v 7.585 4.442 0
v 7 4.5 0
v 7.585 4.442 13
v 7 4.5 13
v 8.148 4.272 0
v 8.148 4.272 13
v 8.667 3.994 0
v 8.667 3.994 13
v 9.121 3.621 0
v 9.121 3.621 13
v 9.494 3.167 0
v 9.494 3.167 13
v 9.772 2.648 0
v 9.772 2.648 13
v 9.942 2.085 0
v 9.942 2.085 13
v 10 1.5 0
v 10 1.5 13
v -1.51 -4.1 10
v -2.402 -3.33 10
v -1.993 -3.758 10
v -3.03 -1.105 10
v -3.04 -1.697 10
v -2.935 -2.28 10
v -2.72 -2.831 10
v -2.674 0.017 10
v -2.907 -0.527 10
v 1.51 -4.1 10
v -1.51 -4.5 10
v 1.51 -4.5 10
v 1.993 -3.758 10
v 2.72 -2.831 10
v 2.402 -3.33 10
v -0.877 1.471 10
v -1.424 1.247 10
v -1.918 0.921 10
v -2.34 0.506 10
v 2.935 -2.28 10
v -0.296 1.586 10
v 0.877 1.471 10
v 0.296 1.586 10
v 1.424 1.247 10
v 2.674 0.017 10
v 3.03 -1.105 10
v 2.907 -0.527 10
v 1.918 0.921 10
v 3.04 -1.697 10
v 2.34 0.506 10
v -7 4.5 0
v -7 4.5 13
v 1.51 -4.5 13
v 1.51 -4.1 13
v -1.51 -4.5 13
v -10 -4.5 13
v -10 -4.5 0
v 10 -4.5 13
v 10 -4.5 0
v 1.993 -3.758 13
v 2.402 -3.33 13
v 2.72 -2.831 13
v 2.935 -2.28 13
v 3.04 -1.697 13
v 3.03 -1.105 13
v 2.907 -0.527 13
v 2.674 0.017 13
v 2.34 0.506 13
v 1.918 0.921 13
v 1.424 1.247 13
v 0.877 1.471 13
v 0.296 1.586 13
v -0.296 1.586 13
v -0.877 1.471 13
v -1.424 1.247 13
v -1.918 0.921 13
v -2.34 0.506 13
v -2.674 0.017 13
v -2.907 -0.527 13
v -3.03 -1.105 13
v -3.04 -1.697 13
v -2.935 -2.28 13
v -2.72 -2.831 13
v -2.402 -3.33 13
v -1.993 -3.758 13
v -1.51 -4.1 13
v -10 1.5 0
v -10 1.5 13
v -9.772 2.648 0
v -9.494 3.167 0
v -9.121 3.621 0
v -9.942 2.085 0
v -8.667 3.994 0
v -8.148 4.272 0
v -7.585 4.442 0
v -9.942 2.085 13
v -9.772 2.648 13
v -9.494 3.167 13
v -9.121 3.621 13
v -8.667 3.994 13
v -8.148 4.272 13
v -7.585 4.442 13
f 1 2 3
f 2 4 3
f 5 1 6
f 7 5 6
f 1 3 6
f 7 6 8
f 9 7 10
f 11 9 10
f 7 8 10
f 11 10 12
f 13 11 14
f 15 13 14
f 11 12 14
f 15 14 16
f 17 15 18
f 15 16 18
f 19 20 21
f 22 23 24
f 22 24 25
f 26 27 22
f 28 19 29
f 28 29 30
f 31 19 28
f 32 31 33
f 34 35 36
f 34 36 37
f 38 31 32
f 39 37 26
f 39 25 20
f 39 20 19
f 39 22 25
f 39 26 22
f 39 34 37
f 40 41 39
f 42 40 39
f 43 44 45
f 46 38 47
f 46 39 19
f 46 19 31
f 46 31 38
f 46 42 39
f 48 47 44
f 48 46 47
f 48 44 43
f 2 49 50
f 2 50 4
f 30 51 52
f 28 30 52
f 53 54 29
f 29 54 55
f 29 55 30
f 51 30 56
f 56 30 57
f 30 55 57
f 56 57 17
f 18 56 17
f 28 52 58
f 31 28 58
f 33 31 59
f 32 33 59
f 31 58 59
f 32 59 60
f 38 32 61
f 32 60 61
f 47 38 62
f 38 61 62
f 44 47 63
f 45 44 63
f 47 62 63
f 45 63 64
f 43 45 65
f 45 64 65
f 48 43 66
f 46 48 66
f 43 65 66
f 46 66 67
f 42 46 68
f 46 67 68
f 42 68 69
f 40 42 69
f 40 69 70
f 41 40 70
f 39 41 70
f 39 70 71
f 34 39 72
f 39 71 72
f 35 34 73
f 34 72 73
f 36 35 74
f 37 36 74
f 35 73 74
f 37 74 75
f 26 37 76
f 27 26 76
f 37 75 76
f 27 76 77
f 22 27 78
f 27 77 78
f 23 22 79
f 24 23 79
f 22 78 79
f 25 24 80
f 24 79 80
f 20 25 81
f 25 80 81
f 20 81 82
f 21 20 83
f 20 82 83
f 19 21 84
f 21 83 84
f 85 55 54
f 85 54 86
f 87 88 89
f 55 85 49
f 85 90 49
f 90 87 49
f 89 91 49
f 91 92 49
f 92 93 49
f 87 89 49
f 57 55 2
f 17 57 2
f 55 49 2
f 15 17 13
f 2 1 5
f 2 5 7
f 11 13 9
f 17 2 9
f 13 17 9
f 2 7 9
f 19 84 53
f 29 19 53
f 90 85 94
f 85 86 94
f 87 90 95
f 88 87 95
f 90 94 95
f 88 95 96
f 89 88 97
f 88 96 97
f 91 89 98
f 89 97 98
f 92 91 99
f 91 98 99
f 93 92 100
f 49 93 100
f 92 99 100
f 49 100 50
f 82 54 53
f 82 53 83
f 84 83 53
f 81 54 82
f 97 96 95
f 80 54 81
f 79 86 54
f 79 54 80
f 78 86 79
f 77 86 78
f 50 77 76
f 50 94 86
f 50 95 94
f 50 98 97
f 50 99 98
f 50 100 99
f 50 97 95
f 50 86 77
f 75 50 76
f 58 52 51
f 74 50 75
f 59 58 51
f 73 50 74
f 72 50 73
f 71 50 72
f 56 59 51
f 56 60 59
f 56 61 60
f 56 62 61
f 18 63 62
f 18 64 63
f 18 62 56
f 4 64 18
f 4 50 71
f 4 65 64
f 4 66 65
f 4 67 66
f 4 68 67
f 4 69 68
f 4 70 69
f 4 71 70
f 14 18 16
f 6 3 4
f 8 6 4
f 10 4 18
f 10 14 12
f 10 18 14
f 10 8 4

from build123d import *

# Parameters (mm, degrees)
SKETCH1_W           = 20
SKETCH1_H           = 9
BOSS_EXTRUDE1_DEPTH = 13
CUT_EXTRUDE1_DEPTH  = 3
FILLET1_R           = 3


with BuildPart() as part:
    # Sketch1 → Boss-Extrude1 (new body)
    with BuildSketch(Plane.XY):
        Rectangle(SKETCH1_W, SKETCH1_H)
    extrude(amount=BOSS_EXTRUDE1_DEPTH)

    # Sketch2 → Cut-Extrude1 (cut)
    with BuildSketch(Plane.XY.offset(13)):
        with BuildLine():
            Line((1.51, -4.5), (1.51, -4.099981132))
            ThreePointArc((1.51, -4.099981132), (0, 1.6), (-1.51, -4.099981132))
            Line((-1.51, -4.099981132), (-1.51, -4.5))
            Line((-1.51, -4.5), (1.51, -4.5))
        make_face()
    extrude(amount=-CUT_EXTRUDE1_DEPTH, mode=Mode.SUBTRACT)

    # Fillet1
    fillet1_edges = [part.edges().sort_by_distance(p)[0] for p in [
        (-10, 4.5, 6.5),
        (10, 4.5, 6.5),
    ]]
    fillet(fillet1_edges, radius=FILLET1_R)


solid = part.part
